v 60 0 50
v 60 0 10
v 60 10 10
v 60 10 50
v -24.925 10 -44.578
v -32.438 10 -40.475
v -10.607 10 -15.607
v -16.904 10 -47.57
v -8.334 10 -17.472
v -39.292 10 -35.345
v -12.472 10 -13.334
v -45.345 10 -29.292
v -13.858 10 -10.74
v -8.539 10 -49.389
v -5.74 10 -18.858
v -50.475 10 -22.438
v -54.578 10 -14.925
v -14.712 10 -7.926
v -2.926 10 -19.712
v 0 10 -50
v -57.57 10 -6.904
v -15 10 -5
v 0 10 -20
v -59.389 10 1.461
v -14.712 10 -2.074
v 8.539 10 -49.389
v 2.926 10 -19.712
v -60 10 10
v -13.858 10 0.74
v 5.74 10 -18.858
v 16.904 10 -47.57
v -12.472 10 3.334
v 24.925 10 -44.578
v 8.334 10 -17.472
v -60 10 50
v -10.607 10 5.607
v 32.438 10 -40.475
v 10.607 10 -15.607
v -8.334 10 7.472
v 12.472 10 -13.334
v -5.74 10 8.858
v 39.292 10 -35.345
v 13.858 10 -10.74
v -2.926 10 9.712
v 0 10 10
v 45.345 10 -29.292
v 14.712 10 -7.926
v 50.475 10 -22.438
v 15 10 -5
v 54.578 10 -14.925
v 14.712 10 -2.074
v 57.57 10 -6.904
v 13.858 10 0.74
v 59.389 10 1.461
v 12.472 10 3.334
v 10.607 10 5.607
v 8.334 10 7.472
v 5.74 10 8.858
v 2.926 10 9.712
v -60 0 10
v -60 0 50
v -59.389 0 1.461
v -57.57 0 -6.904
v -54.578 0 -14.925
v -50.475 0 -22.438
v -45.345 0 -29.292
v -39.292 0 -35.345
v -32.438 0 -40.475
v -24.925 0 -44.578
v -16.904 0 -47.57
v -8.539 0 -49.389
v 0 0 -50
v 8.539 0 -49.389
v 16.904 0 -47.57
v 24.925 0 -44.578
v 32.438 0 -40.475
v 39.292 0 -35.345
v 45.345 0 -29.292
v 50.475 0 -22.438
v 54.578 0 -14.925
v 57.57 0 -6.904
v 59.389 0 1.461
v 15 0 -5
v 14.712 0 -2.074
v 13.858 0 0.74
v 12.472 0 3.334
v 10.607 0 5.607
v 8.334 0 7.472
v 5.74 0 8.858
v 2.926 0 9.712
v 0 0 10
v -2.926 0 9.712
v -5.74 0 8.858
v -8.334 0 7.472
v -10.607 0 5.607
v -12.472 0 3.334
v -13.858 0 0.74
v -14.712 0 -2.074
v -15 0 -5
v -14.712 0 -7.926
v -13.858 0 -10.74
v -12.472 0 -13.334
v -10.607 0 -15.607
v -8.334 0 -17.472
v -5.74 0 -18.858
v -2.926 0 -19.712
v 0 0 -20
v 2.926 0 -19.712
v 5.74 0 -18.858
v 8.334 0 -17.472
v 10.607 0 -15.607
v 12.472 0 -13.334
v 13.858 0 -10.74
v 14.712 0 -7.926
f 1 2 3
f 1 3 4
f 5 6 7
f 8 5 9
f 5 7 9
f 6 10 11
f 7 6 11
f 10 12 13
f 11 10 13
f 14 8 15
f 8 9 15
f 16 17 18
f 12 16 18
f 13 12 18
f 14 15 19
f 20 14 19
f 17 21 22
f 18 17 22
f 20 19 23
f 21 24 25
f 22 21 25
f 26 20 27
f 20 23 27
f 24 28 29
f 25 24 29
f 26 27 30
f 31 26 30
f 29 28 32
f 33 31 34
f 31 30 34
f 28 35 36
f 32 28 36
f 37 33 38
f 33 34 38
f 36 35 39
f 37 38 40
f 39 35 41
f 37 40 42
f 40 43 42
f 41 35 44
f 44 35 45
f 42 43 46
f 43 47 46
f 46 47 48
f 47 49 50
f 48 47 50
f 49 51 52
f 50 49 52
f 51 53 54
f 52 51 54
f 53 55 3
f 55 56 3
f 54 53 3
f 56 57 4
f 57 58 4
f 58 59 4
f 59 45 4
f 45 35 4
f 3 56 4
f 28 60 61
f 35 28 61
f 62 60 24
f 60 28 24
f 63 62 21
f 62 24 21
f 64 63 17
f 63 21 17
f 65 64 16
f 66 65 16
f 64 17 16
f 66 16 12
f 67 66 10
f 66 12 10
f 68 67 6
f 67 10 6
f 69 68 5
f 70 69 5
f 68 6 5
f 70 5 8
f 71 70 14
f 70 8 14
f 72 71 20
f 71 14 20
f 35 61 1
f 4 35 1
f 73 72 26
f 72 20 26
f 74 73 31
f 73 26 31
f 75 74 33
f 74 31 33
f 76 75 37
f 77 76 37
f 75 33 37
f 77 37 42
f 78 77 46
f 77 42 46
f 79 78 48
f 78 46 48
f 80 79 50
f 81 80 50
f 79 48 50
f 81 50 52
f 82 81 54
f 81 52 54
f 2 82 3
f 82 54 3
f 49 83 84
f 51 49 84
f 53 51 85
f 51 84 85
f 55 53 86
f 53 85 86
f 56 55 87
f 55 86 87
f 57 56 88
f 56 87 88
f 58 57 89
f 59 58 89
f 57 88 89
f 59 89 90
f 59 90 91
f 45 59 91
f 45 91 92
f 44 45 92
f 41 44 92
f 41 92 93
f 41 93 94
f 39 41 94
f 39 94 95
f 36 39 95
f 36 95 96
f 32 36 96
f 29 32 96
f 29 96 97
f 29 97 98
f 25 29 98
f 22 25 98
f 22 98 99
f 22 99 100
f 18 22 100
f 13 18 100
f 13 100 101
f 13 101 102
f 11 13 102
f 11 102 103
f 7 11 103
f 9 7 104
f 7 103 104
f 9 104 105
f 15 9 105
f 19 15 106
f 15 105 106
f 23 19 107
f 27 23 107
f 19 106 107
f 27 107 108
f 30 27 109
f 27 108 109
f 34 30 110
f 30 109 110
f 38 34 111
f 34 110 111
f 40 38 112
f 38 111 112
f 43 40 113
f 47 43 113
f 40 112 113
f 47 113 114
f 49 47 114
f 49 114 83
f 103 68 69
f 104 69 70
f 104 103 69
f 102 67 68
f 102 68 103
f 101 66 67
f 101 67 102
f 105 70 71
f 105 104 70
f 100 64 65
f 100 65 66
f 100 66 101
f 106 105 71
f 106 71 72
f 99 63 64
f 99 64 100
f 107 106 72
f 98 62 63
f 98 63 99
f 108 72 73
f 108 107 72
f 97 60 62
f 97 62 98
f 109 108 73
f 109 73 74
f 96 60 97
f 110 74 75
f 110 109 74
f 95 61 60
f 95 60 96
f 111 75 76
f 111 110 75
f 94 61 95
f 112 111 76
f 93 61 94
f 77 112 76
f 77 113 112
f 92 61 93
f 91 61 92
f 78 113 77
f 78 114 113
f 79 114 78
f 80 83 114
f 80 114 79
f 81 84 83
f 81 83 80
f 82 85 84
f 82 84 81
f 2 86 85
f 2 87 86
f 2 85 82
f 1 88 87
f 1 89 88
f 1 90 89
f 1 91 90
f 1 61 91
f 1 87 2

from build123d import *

# Parameters (mm, degrees)
F0_W     = 120
F0_H     = 100
F1_DEPTH = 10
F2_R     = 15
F3_DEPTH = 10.001
F4_R     = 59.99999


# Not quite as in the source:
# - a fillet or chamfer is up to 0.001 mm smaller than in the source, because OpenCascade refuses the exact size


with BuildPart() as f1:
    # F0 (on Front) → F1 (new body)
    with BuildSketch(Plane.XZ):
        Rectangle(F0_W, F0_H)
    extrude(amount=-F1_DEPTH)

    # F2 (on Front) → F3 (cut, through all)
    with BuildSketch(Plane.XZ):
        with Locations((0, -5)):
            Circle(F2_R)
    extrude(amount=-F3_DEPTH, mode=Mode.SUBTRACT)

    # F4 (radius 60 in the source; OpenCascade refuses exactly that, so slightly less here)
    f4_edges = [f1.edges().sort_by_distance(p)[0] for p in [
        (-60, 5, -50),
        (60, 5, -50),
    ]]
    fillet(f4_edges, radius=F4_R)


solid = f1.part
